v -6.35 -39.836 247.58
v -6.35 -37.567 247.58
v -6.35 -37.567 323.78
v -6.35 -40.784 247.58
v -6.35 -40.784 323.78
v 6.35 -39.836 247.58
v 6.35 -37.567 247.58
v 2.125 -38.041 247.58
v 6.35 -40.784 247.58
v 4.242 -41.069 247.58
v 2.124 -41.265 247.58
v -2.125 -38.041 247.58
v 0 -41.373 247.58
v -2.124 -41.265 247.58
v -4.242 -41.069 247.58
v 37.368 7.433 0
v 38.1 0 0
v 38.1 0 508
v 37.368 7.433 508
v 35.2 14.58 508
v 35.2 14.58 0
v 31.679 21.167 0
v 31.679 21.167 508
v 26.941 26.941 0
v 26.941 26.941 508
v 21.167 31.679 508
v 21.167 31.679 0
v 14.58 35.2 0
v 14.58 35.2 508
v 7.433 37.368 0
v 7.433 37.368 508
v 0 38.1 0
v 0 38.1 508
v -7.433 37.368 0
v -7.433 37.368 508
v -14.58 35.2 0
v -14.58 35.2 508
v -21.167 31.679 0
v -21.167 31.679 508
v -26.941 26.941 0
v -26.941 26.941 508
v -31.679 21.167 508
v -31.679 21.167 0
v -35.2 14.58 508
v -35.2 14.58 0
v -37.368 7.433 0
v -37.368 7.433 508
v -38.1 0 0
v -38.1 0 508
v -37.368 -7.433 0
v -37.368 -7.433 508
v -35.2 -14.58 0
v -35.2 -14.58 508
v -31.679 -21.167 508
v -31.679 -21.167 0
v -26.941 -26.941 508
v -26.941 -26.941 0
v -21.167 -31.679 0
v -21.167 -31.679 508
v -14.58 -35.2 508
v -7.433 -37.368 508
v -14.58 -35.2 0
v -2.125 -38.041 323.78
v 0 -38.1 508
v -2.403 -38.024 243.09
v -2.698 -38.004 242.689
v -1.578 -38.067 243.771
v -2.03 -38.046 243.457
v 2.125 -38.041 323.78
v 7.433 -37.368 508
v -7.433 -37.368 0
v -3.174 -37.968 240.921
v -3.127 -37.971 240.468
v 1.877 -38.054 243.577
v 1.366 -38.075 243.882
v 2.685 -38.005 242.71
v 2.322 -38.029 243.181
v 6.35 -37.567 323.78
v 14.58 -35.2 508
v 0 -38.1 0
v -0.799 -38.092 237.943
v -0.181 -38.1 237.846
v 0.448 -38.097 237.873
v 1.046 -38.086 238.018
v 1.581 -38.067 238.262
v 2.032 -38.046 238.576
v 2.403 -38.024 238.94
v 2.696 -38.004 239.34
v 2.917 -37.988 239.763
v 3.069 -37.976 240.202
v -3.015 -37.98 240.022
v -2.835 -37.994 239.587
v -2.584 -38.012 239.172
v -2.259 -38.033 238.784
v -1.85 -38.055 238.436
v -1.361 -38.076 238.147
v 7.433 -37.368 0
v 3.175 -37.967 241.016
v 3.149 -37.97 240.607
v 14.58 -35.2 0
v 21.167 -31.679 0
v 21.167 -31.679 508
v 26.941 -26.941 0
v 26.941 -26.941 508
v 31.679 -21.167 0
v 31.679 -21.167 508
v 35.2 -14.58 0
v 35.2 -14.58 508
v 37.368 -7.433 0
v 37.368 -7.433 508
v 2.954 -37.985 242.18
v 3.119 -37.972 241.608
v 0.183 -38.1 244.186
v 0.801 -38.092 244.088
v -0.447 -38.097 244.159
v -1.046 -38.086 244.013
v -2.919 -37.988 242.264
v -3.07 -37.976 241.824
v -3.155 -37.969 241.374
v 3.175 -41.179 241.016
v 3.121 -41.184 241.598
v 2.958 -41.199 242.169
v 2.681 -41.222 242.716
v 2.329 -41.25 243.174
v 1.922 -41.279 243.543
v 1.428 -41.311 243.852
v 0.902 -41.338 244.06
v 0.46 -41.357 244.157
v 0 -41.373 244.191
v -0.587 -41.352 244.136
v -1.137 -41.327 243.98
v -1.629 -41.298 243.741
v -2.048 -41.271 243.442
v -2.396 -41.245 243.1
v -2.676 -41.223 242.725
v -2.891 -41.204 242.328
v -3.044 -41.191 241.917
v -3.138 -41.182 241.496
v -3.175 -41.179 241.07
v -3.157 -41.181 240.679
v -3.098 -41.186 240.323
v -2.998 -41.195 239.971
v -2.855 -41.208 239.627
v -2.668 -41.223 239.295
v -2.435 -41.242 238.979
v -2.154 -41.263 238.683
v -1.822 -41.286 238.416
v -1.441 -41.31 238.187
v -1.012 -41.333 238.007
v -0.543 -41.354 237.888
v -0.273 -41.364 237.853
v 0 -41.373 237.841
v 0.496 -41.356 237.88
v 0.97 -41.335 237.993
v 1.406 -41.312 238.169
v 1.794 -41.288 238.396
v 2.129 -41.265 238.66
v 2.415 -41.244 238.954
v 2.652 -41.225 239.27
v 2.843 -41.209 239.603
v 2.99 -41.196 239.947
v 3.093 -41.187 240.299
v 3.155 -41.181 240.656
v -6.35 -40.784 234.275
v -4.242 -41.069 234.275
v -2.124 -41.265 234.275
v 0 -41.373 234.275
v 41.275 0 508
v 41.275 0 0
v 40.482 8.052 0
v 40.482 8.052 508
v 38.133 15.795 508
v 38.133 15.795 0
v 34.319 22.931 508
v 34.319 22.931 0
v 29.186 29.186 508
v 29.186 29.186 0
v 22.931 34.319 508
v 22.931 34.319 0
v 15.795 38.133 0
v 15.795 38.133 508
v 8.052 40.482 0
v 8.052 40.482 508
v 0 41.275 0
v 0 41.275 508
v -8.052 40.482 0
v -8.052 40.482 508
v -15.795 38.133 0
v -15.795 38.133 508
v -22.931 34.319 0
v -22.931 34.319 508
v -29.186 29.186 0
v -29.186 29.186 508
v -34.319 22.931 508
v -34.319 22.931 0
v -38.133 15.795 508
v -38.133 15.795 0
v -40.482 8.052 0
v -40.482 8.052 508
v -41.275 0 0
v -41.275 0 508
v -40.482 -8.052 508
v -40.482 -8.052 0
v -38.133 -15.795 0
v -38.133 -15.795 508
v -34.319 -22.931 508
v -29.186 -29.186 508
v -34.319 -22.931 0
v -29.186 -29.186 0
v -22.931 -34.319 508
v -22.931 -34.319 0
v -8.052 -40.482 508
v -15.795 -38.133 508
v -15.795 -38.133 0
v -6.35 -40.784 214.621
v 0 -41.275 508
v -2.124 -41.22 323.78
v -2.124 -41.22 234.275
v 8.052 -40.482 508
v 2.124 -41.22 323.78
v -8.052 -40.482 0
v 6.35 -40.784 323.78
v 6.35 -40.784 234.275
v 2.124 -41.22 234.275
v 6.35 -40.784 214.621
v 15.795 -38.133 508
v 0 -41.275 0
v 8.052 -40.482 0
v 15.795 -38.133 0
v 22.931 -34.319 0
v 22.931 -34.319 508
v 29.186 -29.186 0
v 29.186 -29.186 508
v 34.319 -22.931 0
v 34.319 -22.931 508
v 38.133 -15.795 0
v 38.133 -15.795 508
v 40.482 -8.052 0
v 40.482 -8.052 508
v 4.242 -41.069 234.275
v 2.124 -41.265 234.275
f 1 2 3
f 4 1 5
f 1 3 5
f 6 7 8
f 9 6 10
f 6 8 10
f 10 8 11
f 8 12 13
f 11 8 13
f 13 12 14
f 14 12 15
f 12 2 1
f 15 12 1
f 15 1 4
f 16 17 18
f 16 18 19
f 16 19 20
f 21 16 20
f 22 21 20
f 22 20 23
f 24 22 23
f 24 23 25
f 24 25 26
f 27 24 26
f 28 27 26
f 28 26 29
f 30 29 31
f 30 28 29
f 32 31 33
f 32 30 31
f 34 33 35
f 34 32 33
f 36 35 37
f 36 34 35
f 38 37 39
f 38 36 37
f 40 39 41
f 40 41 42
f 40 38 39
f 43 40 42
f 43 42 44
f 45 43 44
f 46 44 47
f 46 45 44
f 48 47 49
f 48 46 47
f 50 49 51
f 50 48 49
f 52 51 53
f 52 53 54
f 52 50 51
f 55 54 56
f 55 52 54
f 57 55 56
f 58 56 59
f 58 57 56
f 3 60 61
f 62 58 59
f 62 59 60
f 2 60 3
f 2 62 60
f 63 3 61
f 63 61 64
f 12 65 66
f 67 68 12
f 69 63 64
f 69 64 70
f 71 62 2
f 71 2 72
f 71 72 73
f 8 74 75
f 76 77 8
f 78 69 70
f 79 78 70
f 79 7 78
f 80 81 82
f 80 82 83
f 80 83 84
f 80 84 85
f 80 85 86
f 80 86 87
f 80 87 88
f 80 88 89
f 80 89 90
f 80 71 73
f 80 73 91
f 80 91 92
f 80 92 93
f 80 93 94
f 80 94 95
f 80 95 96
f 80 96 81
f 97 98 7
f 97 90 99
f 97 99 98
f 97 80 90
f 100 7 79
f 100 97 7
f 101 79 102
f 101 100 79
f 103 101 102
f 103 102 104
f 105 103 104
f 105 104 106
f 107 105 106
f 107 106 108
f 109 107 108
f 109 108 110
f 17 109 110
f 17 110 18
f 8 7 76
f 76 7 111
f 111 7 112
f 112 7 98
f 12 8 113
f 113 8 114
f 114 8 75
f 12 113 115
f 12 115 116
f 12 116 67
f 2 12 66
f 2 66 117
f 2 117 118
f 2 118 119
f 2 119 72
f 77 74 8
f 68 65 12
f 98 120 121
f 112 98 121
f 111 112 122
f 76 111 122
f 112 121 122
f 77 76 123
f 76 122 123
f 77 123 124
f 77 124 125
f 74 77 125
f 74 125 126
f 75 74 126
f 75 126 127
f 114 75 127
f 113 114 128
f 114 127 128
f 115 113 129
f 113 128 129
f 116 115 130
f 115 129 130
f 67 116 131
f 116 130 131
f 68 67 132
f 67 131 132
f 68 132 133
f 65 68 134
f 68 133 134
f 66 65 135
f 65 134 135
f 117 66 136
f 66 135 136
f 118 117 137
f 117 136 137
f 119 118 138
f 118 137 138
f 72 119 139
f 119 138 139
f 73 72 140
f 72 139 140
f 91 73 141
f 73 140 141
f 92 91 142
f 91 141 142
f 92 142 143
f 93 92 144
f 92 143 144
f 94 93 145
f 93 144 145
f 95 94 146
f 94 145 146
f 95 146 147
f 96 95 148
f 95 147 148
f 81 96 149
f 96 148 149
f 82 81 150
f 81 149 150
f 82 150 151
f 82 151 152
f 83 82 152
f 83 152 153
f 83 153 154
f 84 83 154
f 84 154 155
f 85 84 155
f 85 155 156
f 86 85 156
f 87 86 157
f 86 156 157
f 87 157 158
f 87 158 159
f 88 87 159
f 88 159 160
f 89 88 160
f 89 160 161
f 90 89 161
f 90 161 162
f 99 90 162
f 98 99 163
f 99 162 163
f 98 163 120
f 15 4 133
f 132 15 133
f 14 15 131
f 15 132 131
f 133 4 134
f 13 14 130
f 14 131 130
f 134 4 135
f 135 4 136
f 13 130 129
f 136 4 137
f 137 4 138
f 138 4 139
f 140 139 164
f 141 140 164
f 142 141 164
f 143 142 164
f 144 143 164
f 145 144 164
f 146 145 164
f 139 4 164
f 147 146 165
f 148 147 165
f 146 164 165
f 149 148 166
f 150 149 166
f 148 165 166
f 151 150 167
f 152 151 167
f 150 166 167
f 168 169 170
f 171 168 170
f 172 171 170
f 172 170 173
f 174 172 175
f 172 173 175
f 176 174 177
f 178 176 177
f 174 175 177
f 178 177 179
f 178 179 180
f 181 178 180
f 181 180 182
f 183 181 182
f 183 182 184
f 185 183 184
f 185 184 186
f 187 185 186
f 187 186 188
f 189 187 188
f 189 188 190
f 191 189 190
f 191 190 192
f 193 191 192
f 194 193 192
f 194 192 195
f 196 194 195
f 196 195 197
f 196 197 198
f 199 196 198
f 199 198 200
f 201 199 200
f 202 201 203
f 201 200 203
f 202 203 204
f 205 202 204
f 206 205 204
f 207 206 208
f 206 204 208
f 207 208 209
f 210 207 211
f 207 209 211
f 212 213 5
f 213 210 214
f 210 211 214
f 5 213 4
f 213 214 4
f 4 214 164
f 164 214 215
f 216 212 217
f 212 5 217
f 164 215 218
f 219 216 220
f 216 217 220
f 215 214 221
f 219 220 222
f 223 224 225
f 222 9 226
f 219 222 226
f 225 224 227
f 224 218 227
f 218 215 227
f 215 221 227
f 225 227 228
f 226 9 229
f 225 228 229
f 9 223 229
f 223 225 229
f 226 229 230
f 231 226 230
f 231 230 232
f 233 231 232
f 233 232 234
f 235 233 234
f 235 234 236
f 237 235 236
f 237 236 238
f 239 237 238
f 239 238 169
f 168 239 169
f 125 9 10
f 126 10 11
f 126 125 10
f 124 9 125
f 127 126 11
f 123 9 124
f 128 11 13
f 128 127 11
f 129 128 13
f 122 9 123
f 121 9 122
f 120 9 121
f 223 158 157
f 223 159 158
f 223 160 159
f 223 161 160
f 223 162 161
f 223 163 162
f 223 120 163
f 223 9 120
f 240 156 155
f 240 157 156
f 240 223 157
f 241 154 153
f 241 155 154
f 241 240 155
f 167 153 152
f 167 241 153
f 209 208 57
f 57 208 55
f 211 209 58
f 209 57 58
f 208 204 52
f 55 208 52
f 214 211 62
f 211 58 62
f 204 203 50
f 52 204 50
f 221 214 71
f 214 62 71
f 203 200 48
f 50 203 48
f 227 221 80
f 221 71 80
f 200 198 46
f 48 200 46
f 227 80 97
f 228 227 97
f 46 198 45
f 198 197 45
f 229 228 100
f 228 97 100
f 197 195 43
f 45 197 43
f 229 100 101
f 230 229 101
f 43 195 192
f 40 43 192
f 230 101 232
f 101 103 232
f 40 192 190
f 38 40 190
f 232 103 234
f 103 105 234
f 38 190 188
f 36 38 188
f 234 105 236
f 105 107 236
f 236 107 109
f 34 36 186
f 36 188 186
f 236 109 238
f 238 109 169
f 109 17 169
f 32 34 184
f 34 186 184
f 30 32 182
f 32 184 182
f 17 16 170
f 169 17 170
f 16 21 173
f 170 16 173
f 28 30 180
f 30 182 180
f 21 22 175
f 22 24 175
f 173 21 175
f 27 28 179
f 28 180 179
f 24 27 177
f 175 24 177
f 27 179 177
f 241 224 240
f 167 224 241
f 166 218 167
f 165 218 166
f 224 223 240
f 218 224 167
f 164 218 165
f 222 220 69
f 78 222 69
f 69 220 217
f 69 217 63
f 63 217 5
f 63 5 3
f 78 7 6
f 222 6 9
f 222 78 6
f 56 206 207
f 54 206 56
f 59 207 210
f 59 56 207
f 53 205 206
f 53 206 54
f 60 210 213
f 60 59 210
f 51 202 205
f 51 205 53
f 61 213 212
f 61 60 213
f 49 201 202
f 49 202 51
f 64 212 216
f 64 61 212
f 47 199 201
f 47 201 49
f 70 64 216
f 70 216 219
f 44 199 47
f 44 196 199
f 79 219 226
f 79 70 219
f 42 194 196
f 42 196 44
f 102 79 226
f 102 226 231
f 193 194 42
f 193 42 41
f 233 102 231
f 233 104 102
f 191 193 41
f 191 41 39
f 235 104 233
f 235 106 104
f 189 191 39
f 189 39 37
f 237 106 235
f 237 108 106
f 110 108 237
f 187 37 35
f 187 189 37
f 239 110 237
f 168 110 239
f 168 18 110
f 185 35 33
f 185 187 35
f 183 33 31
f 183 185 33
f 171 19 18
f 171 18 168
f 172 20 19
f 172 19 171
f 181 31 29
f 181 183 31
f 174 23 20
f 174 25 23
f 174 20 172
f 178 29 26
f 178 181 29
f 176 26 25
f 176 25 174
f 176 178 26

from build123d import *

# Parameters (mm, degrees)
F0_R        = 41.275
F0_R_2      = 38.1
F1_DEPTH    = 508
F3_W        = 1.5594176948
F3_H        = 13.3043527603
F4_DEPTH    = 6.35
F5_DEPTH    = 6.35
F6_R        = 3.175
F7_DEPTH    = 25.4
F8_T1_DEPTH = 52.6135854812


# Not quite as in the source:
# - a fillet or chamfer that OpenCascade refuses, or shapes differently, is made with other operations: its cross-section is extruded or revolved along the edge and cut away or added


with BuildPart() as f1:
    # F0 (on Top) → F1 (new body)
    with BuildSketch(Plane.XY):
        Circle(F0_R)
        Circle(F0_R_2, mode=Mode.SUBTRACT)
    extrude(amount=F1_DEPTH)

    # F3 (on face) → F4 (cut, symmetric)
    with BuildSketch(Plane(origin=(0, 0, 0), x_dir=(0, -1, 0), z_dir=(-1, 0, 0))):
        Polygon((63.4511685878, 247.5796341896), (63.4511685878, 323.7796341896), (25.3511685878, 323.7796341896), (25.3511685878, 247.5796341896), (39.8362353444, 247.5796341896), (41.3956530392, 247.5796341896), align=None)
        with Locations((40.6159441918, 240.9274578094)):
            Rectangle(F3_W, F3_H)
    extrude(amount=F4_DEPTH, both=True, mode=Mode.SUBTRACT)

    # F3 (on face) → F5 (join, symmetric)
    with BuildSketch(Plane(origin=(0, 0, 0), x_dir=(0, -1, 0), z_dir=(-1, 0, 0))):
        with Locations((40.6159441918, 240.9274578094)):
            Rectangle(F3_W, F3_H)
    extrude(amount=F5_DEPTH, both=True)

    # F6 (on face) → F7 (cut)
    with BuildSketch(Plane.XZ.offset(41.3956530392)):
        with Locations((0, 241.0158216953)):
            Circle(F6_R)
    extrude(amount=-F7_DEPTH, mode=Mode.SUBTRACT)

    # F8: fillet of radius 50.8 on 2 edges, made by hand

    # F8_s2 → F8_t1 (cut)
    with BuildSketch(Plane.XY.offset(214.6206650688)):
        with BuildLine():
            ThreePointArc((-6.35, -40.7836134373), (-2.4309704551, -41.2424120087), (1.5118465442, -41.3956530392))
            Line((1.5118465442, -41.3956530392), (-6.35, -41.3956530392))
            Line((-6.35, -41.3956530392), (-6.35, -40.7836134373))
        make_face()
        with BuildLine():
            ThreePointArc((6.35, -40.7836134373), (2.4309704551, -41.2424120087), (-1.5118465442, -41.3956530392))
            Line((-1.5118465442, -41.3956530392), (6.35, -41.3956530392))
            Line((6.35, -41.3956530392), (6.35, -40.7836134373))
        make_face()
    extrude(amount=F8_T1_DEPTH, mode=Mode.SUBTRACT)


solid = f1.part
